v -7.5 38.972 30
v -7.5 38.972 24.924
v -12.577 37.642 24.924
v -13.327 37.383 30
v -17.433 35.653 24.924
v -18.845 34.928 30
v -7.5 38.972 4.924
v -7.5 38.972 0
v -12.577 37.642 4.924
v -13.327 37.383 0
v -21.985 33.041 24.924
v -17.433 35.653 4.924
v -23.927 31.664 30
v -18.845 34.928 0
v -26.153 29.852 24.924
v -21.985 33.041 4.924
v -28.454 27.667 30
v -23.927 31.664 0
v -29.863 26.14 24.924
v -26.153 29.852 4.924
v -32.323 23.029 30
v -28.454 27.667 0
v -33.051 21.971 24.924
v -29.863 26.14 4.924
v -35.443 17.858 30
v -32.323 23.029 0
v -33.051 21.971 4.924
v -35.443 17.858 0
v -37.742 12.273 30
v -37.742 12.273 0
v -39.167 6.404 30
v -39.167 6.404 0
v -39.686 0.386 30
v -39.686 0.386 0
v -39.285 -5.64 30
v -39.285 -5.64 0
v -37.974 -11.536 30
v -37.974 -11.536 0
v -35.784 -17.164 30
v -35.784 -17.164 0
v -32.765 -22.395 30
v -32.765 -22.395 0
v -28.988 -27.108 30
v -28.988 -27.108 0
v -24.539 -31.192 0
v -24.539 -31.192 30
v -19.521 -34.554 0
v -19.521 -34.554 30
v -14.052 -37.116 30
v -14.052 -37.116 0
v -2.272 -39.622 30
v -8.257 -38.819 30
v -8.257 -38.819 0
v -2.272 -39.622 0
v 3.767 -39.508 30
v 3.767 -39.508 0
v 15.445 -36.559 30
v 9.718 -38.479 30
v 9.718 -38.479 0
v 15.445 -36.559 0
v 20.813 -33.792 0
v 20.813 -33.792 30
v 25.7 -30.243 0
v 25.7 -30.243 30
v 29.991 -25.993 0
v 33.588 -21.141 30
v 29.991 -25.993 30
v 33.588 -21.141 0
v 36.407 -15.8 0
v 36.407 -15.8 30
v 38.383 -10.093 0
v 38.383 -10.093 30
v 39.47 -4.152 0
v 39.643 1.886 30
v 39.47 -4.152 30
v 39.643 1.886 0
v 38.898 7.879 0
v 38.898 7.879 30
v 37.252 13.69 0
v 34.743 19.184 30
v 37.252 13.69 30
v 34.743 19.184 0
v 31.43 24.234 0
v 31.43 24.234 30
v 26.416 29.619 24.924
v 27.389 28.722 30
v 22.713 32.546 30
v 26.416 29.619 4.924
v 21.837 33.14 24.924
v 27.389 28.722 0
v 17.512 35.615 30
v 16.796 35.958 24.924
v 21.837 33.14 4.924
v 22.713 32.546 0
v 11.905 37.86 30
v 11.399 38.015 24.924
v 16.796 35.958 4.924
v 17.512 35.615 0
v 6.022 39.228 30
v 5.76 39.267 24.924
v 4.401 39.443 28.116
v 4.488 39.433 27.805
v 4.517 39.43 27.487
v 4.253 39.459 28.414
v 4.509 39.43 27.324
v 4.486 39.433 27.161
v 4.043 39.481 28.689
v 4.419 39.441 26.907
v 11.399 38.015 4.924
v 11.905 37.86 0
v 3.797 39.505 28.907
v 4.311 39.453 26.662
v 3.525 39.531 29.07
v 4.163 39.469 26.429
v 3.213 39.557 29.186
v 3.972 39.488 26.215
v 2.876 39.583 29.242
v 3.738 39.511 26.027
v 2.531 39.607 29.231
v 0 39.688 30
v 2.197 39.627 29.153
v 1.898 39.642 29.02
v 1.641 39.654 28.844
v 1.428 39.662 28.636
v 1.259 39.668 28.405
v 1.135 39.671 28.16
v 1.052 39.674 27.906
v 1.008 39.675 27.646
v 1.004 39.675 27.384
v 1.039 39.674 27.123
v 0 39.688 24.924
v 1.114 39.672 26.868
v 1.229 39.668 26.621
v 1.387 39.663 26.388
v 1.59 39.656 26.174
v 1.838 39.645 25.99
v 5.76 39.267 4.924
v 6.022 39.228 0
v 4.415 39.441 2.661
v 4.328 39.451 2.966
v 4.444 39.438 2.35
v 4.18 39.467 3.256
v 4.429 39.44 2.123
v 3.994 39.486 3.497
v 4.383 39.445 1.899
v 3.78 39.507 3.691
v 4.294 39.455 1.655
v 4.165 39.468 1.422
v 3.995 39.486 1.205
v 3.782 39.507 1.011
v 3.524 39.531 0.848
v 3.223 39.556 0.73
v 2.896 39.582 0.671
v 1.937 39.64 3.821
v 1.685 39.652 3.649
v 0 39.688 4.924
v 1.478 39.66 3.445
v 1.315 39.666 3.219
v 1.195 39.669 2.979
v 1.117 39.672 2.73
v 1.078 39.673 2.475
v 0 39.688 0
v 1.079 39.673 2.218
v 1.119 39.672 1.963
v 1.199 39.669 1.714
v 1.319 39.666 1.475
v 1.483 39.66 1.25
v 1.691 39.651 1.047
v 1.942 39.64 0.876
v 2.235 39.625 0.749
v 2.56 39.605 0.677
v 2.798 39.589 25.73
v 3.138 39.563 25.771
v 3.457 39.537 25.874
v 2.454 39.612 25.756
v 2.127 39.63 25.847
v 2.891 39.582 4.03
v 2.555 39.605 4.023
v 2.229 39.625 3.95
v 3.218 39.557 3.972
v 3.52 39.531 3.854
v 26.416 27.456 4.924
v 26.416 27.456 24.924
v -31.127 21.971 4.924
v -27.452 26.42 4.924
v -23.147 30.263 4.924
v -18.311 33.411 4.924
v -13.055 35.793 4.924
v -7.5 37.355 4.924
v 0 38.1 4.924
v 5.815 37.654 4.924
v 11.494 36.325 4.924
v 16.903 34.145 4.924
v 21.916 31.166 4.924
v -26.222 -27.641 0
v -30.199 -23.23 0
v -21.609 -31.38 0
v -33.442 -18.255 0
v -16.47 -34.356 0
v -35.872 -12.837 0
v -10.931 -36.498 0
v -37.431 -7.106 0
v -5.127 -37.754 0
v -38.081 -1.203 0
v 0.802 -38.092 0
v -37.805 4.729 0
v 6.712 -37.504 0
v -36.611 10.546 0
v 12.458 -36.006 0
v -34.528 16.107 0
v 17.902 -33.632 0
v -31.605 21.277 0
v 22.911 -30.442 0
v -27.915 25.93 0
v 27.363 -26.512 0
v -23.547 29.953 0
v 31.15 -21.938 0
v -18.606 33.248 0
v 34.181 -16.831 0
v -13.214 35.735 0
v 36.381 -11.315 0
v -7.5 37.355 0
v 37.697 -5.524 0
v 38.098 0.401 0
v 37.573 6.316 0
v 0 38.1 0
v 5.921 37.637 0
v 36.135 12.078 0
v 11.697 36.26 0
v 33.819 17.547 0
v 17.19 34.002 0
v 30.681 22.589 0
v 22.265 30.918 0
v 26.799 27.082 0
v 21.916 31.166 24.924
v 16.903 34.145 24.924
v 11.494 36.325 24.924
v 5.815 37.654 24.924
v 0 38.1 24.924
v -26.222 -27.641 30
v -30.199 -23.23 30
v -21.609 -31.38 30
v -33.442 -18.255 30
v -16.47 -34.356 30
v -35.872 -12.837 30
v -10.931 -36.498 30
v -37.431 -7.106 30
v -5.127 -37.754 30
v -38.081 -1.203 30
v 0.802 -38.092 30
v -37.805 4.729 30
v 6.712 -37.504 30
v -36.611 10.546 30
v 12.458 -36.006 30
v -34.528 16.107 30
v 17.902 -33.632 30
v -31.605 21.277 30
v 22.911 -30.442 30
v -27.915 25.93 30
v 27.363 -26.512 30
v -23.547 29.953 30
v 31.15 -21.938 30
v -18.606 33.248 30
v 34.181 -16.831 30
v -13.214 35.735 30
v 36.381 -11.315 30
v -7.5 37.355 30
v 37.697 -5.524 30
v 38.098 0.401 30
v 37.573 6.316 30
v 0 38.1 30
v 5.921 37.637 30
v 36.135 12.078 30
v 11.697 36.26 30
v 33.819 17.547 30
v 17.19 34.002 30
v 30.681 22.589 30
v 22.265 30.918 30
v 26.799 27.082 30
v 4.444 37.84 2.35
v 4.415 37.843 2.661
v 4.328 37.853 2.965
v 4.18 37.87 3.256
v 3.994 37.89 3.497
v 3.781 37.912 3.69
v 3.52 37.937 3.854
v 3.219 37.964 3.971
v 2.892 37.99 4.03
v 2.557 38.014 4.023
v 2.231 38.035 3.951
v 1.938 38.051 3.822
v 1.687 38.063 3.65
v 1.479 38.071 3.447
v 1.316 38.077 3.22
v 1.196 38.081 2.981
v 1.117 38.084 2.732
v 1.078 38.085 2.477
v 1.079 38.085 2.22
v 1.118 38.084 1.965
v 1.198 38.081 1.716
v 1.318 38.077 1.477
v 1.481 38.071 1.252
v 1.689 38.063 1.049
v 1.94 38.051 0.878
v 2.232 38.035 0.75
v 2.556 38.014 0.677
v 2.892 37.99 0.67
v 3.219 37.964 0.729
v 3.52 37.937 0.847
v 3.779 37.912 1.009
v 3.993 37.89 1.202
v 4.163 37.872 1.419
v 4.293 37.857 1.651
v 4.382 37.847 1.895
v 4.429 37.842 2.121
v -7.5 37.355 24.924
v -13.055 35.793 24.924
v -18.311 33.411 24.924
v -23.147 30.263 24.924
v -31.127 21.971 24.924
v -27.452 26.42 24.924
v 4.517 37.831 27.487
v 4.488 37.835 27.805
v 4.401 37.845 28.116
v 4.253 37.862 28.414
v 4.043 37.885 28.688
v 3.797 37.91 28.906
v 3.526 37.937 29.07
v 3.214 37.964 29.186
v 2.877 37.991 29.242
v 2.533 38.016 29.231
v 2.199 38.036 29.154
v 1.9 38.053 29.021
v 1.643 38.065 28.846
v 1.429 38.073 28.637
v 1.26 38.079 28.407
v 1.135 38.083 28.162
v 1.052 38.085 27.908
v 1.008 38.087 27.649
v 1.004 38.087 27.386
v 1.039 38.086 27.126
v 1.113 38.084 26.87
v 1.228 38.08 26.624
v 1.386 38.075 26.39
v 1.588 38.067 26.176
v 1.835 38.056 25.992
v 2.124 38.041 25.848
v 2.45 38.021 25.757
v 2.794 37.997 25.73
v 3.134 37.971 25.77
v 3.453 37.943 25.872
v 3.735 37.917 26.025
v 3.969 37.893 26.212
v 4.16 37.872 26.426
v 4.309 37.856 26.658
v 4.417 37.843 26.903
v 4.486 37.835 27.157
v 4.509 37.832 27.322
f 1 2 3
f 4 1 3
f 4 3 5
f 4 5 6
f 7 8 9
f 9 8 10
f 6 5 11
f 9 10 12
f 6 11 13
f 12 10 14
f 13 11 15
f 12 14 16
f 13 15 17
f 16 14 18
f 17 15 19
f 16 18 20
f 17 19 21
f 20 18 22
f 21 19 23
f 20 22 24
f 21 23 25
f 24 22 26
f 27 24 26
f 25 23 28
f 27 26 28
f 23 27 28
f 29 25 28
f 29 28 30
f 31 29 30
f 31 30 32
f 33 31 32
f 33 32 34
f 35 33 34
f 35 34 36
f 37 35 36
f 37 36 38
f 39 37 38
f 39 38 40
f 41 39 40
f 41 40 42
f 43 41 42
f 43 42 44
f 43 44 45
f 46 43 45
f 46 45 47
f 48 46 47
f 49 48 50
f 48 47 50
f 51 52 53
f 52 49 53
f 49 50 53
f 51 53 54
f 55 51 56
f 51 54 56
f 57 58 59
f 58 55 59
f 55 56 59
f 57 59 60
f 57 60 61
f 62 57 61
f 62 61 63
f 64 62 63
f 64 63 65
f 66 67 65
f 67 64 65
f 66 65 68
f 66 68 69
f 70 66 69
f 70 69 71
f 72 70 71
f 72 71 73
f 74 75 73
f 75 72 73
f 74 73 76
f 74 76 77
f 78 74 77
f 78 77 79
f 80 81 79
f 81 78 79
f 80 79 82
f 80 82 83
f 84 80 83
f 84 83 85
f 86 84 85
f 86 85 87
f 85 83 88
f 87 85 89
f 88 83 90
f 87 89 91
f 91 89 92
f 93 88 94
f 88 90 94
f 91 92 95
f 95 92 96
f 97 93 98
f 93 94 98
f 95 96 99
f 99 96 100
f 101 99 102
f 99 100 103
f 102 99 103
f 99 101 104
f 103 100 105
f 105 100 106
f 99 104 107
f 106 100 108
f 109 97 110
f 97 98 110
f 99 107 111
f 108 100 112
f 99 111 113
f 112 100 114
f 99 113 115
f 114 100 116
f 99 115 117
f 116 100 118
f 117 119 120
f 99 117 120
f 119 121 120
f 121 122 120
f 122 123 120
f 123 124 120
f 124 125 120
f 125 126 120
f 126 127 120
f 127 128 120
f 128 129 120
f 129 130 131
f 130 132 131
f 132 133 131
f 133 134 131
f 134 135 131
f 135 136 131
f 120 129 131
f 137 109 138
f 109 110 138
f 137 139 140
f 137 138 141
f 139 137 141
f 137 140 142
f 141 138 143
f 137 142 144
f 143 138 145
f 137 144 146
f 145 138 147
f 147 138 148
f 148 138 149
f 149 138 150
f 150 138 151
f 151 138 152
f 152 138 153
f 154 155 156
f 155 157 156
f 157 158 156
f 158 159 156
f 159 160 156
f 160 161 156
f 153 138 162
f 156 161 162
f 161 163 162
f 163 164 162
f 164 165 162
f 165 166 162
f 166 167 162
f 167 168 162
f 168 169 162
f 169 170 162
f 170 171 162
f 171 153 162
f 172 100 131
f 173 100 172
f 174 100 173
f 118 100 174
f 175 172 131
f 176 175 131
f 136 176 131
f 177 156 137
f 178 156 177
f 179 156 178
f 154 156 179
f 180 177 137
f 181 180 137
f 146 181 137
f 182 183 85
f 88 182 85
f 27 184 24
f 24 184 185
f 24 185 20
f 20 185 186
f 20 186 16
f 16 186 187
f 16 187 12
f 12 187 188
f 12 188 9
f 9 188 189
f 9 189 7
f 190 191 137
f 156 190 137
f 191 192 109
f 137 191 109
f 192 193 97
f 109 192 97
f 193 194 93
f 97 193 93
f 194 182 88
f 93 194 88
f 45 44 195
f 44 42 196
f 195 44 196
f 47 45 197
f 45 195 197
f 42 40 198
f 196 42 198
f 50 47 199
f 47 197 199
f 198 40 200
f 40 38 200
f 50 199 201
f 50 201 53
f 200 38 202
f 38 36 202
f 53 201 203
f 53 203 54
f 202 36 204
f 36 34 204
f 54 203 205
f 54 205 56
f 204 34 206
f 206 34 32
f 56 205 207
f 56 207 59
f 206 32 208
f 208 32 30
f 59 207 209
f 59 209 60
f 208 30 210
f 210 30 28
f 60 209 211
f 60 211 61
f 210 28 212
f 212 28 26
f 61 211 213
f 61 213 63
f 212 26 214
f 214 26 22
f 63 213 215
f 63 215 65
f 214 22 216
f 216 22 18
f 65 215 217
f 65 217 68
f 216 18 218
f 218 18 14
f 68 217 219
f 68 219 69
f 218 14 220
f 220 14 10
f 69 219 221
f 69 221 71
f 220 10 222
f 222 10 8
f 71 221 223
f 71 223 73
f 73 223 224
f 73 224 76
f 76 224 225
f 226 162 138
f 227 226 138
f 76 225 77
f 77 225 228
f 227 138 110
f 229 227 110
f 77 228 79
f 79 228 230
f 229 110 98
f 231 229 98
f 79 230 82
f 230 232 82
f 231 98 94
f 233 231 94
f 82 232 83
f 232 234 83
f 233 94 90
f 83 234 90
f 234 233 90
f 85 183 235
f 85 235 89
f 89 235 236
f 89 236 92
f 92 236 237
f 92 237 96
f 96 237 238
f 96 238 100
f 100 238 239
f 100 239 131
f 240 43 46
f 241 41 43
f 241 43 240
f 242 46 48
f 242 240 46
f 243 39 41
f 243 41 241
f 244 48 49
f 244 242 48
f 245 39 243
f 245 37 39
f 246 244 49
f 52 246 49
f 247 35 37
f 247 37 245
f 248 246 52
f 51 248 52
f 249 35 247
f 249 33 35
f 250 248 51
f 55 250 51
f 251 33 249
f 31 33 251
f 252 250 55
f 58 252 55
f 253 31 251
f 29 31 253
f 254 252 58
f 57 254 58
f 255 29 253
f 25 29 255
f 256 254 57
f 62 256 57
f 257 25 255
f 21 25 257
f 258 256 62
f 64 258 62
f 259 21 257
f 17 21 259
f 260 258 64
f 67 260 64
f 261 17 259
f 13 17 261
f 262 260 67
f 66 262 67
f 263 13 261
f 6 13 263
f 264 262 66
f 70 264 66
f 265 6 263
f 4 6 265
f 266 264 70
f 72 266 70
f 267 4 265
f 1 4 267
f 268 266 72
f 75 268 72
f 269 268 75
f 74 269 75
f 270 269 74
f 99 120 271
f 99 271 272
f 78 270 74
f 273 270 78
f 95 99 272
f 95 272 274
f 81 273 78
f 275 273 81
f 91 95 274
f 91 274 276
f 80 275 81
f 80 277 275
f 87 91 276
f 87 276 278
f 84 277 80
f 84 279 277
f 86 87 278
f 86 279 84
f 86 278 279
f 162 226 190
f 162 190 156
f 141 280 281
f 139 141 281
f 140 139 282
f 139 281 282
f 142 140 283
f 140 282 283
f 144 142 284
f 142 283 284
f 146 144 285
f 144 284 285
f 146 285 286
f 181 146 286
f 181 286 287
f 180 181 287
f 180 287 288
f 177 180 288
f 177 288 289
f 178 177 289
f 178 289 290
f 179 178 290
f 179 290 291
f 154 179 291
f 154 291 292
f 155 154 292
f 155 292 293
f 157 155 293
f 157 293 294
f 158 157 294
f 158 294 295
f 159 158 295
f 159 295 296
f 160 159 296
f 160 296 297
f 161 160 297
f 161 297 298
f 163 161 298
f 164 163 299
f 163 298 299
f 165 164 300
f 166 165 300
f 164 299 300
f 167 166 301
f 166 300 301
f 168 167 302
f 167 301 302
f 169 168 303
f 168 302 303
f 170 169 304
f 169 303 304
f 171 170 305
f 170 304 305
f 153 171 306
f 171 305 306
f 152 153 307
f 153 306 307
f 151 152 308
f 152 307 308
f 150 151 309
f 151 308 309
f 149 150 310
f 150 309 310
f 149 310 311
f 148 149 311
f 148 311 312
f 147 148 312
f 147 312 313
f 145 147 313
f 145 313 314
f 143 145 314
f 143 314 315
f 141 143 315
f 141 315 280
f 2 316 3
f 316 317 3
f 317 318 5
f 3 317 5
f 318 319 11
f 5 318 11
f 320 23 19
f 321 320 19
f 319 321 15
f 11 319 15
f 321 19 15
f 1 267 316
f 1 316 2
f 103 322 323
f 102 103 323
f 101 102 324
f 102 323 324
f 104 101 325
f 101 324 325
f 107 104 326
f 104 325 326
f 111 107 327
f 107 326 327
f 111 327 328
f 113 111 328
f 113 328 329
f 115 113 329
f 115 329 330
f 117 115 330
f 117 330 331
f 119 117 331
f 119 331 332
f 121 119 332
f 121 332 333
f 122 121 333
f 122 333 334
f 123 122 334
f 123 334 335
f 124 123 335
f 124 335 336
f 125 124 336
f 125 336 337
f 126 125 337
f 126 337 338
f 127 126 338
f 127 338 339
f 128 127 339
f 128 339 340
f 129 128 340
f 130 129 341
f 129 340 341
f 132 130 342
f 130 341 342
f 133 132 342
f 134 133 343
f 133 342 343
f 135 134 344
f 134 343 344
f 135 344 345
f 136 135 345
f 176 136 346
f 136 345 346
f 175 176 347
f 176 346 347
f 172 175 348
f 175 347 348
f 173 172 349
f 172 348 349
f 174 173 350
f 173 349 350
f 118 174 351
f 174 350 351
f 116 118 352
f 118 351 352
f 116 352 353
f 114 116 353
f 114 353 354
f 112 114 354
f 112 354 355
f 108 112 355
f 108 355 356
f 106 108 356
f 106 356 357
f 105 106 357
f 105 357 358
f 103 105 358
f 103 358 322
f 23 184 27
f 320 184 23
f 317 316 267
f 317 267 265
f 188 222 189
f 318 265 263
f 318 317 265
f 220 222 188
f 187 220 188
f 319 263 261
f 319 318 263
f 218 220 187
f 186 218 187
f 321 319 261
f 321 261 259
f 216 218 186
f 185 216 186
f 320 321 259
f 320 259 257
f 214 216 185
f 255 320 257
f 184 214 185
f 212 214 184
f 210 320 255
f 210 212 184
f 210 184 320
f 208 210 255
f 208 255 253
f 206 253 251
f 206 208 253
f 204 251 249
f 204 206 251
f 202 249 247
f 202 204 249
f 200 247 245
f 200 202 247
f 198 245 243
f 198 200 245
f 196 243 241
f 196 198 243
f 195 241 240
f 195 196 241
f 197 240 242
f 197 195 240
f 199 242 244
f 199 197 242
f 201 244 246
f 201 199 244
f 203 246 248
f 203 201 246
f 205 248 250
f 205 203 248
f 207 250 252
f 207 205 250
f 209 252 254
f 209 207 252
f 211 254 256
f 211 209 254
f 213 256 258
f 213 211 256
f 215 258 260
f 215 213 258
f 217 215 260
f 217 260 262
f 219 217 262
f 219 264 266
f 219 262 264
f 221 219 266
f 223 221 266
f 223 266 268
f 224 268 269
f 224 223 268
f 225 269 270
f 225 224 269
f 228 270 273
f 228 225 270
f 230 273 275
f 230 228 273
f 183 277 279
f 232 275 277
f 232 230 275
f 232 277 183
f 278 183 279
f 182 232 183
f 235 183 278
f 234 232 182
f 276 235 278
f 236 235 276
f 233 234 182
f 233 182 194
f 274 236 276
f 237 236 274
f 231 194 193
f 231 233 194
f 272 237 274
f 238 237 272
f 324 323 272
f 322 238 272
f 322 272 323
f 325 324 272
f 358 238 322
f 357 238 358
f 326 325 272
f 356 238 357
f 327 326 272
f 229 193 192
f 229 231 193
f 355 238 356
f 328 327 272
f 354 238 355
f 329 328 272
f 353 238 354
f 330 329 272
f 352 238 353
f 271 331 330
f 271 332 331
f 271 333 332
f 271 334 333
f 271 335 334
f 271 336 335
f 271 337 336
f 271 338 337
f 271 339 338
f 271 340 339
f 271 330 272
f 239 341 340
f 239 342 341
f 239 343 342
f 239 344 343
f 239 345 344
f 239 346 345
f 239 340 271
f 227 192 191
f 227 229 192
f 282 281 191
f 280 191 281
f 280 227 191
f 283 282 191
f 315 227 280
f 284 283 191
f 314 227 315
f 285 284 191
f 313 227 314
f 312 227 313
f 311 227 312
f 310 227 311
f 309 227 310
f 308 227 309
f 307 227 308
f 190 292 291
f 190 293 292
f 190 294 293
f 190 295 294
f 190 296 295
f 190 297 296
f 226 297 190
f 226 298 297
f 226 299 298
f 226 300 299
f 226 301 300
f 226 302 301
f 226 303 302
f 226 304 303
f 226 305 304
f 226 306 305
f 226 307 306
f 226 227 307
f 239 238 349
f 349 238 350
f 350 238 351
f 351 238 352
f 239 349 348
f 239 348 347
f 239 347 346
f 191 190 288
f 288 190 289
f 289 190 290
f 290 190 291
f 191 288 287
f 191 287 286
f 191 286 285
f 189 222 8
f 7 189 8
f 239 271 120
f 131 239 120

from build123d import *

# Parameters (mm, degrees)
F0_R          = 39.6875
F0_R_2        = 38.1
F1_DEPTH      = 30
F2_W          = 25.0000006067
F2_H          = 20
F3_DEPTH      = 37.846
F3_DEPTH_BACK = 26.416
F4_W          = 36.5361310542
F4_H          = 63.4360015392
F5_DEPTH      = 7.5
F6_R          = 1.7228830897
F6_R_2        = 2.0395757716
F7_DEPTH      = 25.4
F7_DEPTH_BACK = 13.462
F8_R          = 1.7580369287
F8_R_2        = 1.6852602443
F9_DEPTH      = 50


with BuildPart() as f1:
    # F0 (on Top) → F1 (new body)
    with BuildSketch(Plane.XY):
        Circle(F0_R)
        Circle(F0_R_2, mode=Mode.SUBTRACT)
    extrude(amount=F1_DEPTH)

    # F2 (on Right) → F3 (cut, two sides)
    with BuildSketch(Plane.YZ) as f3_sk:
        with Locations((34.4710433856, 14.9242004845)):
            Rectangle(F2_W, F2_H)
    extrude(amount=-F3_DEPTH, mode=Mode.SUBTRACT)
    extrude(f3_sk.sketch, amount=F3_DEPTH_BACK, mode=Mode.SUBTRACT)

    # F4 (on Right) → F5 (cut)
    with BuildSketch(Plane.YZ):
        with Locations((49.4740214199, 27.9371961951)):
            Rectangle(F4_W, F4_H)
    extrude(amount=-F5_DEPTH, mode=Mode.SUBTRACT)

    # F6 (on Front) → F7 (cut, two sides)
    with BuildSketch(Plane.XZ) as f7_sk:
        with Locations((-17.5434835255, -25.1583587378)):
            Circle(F6_R)
        with Locations((-17.5434835255, 0)):
            Circle(F6_R_2)
    extrude(amount=-F7_DEPTH, mode=Mode.SUBTRACT)
    extrude(f7_sk.sketch, amount=F7_DEPTH_BACK, mode=Mode.SUBTRACT)

    # F8 (on Front) → F9 (cut)
    with BuildSketch(Plane.XZ):
        with Locations((2.758965129, 27.4874716997)):
            Circle(F8_R)
        with Locations((2.758965129, 2.3502300028)):
            Circle(F8_R_2)
    extrude(amount=-F9_DEPTH, mode=Mode.SUBTRACT)


solid = f1.part
